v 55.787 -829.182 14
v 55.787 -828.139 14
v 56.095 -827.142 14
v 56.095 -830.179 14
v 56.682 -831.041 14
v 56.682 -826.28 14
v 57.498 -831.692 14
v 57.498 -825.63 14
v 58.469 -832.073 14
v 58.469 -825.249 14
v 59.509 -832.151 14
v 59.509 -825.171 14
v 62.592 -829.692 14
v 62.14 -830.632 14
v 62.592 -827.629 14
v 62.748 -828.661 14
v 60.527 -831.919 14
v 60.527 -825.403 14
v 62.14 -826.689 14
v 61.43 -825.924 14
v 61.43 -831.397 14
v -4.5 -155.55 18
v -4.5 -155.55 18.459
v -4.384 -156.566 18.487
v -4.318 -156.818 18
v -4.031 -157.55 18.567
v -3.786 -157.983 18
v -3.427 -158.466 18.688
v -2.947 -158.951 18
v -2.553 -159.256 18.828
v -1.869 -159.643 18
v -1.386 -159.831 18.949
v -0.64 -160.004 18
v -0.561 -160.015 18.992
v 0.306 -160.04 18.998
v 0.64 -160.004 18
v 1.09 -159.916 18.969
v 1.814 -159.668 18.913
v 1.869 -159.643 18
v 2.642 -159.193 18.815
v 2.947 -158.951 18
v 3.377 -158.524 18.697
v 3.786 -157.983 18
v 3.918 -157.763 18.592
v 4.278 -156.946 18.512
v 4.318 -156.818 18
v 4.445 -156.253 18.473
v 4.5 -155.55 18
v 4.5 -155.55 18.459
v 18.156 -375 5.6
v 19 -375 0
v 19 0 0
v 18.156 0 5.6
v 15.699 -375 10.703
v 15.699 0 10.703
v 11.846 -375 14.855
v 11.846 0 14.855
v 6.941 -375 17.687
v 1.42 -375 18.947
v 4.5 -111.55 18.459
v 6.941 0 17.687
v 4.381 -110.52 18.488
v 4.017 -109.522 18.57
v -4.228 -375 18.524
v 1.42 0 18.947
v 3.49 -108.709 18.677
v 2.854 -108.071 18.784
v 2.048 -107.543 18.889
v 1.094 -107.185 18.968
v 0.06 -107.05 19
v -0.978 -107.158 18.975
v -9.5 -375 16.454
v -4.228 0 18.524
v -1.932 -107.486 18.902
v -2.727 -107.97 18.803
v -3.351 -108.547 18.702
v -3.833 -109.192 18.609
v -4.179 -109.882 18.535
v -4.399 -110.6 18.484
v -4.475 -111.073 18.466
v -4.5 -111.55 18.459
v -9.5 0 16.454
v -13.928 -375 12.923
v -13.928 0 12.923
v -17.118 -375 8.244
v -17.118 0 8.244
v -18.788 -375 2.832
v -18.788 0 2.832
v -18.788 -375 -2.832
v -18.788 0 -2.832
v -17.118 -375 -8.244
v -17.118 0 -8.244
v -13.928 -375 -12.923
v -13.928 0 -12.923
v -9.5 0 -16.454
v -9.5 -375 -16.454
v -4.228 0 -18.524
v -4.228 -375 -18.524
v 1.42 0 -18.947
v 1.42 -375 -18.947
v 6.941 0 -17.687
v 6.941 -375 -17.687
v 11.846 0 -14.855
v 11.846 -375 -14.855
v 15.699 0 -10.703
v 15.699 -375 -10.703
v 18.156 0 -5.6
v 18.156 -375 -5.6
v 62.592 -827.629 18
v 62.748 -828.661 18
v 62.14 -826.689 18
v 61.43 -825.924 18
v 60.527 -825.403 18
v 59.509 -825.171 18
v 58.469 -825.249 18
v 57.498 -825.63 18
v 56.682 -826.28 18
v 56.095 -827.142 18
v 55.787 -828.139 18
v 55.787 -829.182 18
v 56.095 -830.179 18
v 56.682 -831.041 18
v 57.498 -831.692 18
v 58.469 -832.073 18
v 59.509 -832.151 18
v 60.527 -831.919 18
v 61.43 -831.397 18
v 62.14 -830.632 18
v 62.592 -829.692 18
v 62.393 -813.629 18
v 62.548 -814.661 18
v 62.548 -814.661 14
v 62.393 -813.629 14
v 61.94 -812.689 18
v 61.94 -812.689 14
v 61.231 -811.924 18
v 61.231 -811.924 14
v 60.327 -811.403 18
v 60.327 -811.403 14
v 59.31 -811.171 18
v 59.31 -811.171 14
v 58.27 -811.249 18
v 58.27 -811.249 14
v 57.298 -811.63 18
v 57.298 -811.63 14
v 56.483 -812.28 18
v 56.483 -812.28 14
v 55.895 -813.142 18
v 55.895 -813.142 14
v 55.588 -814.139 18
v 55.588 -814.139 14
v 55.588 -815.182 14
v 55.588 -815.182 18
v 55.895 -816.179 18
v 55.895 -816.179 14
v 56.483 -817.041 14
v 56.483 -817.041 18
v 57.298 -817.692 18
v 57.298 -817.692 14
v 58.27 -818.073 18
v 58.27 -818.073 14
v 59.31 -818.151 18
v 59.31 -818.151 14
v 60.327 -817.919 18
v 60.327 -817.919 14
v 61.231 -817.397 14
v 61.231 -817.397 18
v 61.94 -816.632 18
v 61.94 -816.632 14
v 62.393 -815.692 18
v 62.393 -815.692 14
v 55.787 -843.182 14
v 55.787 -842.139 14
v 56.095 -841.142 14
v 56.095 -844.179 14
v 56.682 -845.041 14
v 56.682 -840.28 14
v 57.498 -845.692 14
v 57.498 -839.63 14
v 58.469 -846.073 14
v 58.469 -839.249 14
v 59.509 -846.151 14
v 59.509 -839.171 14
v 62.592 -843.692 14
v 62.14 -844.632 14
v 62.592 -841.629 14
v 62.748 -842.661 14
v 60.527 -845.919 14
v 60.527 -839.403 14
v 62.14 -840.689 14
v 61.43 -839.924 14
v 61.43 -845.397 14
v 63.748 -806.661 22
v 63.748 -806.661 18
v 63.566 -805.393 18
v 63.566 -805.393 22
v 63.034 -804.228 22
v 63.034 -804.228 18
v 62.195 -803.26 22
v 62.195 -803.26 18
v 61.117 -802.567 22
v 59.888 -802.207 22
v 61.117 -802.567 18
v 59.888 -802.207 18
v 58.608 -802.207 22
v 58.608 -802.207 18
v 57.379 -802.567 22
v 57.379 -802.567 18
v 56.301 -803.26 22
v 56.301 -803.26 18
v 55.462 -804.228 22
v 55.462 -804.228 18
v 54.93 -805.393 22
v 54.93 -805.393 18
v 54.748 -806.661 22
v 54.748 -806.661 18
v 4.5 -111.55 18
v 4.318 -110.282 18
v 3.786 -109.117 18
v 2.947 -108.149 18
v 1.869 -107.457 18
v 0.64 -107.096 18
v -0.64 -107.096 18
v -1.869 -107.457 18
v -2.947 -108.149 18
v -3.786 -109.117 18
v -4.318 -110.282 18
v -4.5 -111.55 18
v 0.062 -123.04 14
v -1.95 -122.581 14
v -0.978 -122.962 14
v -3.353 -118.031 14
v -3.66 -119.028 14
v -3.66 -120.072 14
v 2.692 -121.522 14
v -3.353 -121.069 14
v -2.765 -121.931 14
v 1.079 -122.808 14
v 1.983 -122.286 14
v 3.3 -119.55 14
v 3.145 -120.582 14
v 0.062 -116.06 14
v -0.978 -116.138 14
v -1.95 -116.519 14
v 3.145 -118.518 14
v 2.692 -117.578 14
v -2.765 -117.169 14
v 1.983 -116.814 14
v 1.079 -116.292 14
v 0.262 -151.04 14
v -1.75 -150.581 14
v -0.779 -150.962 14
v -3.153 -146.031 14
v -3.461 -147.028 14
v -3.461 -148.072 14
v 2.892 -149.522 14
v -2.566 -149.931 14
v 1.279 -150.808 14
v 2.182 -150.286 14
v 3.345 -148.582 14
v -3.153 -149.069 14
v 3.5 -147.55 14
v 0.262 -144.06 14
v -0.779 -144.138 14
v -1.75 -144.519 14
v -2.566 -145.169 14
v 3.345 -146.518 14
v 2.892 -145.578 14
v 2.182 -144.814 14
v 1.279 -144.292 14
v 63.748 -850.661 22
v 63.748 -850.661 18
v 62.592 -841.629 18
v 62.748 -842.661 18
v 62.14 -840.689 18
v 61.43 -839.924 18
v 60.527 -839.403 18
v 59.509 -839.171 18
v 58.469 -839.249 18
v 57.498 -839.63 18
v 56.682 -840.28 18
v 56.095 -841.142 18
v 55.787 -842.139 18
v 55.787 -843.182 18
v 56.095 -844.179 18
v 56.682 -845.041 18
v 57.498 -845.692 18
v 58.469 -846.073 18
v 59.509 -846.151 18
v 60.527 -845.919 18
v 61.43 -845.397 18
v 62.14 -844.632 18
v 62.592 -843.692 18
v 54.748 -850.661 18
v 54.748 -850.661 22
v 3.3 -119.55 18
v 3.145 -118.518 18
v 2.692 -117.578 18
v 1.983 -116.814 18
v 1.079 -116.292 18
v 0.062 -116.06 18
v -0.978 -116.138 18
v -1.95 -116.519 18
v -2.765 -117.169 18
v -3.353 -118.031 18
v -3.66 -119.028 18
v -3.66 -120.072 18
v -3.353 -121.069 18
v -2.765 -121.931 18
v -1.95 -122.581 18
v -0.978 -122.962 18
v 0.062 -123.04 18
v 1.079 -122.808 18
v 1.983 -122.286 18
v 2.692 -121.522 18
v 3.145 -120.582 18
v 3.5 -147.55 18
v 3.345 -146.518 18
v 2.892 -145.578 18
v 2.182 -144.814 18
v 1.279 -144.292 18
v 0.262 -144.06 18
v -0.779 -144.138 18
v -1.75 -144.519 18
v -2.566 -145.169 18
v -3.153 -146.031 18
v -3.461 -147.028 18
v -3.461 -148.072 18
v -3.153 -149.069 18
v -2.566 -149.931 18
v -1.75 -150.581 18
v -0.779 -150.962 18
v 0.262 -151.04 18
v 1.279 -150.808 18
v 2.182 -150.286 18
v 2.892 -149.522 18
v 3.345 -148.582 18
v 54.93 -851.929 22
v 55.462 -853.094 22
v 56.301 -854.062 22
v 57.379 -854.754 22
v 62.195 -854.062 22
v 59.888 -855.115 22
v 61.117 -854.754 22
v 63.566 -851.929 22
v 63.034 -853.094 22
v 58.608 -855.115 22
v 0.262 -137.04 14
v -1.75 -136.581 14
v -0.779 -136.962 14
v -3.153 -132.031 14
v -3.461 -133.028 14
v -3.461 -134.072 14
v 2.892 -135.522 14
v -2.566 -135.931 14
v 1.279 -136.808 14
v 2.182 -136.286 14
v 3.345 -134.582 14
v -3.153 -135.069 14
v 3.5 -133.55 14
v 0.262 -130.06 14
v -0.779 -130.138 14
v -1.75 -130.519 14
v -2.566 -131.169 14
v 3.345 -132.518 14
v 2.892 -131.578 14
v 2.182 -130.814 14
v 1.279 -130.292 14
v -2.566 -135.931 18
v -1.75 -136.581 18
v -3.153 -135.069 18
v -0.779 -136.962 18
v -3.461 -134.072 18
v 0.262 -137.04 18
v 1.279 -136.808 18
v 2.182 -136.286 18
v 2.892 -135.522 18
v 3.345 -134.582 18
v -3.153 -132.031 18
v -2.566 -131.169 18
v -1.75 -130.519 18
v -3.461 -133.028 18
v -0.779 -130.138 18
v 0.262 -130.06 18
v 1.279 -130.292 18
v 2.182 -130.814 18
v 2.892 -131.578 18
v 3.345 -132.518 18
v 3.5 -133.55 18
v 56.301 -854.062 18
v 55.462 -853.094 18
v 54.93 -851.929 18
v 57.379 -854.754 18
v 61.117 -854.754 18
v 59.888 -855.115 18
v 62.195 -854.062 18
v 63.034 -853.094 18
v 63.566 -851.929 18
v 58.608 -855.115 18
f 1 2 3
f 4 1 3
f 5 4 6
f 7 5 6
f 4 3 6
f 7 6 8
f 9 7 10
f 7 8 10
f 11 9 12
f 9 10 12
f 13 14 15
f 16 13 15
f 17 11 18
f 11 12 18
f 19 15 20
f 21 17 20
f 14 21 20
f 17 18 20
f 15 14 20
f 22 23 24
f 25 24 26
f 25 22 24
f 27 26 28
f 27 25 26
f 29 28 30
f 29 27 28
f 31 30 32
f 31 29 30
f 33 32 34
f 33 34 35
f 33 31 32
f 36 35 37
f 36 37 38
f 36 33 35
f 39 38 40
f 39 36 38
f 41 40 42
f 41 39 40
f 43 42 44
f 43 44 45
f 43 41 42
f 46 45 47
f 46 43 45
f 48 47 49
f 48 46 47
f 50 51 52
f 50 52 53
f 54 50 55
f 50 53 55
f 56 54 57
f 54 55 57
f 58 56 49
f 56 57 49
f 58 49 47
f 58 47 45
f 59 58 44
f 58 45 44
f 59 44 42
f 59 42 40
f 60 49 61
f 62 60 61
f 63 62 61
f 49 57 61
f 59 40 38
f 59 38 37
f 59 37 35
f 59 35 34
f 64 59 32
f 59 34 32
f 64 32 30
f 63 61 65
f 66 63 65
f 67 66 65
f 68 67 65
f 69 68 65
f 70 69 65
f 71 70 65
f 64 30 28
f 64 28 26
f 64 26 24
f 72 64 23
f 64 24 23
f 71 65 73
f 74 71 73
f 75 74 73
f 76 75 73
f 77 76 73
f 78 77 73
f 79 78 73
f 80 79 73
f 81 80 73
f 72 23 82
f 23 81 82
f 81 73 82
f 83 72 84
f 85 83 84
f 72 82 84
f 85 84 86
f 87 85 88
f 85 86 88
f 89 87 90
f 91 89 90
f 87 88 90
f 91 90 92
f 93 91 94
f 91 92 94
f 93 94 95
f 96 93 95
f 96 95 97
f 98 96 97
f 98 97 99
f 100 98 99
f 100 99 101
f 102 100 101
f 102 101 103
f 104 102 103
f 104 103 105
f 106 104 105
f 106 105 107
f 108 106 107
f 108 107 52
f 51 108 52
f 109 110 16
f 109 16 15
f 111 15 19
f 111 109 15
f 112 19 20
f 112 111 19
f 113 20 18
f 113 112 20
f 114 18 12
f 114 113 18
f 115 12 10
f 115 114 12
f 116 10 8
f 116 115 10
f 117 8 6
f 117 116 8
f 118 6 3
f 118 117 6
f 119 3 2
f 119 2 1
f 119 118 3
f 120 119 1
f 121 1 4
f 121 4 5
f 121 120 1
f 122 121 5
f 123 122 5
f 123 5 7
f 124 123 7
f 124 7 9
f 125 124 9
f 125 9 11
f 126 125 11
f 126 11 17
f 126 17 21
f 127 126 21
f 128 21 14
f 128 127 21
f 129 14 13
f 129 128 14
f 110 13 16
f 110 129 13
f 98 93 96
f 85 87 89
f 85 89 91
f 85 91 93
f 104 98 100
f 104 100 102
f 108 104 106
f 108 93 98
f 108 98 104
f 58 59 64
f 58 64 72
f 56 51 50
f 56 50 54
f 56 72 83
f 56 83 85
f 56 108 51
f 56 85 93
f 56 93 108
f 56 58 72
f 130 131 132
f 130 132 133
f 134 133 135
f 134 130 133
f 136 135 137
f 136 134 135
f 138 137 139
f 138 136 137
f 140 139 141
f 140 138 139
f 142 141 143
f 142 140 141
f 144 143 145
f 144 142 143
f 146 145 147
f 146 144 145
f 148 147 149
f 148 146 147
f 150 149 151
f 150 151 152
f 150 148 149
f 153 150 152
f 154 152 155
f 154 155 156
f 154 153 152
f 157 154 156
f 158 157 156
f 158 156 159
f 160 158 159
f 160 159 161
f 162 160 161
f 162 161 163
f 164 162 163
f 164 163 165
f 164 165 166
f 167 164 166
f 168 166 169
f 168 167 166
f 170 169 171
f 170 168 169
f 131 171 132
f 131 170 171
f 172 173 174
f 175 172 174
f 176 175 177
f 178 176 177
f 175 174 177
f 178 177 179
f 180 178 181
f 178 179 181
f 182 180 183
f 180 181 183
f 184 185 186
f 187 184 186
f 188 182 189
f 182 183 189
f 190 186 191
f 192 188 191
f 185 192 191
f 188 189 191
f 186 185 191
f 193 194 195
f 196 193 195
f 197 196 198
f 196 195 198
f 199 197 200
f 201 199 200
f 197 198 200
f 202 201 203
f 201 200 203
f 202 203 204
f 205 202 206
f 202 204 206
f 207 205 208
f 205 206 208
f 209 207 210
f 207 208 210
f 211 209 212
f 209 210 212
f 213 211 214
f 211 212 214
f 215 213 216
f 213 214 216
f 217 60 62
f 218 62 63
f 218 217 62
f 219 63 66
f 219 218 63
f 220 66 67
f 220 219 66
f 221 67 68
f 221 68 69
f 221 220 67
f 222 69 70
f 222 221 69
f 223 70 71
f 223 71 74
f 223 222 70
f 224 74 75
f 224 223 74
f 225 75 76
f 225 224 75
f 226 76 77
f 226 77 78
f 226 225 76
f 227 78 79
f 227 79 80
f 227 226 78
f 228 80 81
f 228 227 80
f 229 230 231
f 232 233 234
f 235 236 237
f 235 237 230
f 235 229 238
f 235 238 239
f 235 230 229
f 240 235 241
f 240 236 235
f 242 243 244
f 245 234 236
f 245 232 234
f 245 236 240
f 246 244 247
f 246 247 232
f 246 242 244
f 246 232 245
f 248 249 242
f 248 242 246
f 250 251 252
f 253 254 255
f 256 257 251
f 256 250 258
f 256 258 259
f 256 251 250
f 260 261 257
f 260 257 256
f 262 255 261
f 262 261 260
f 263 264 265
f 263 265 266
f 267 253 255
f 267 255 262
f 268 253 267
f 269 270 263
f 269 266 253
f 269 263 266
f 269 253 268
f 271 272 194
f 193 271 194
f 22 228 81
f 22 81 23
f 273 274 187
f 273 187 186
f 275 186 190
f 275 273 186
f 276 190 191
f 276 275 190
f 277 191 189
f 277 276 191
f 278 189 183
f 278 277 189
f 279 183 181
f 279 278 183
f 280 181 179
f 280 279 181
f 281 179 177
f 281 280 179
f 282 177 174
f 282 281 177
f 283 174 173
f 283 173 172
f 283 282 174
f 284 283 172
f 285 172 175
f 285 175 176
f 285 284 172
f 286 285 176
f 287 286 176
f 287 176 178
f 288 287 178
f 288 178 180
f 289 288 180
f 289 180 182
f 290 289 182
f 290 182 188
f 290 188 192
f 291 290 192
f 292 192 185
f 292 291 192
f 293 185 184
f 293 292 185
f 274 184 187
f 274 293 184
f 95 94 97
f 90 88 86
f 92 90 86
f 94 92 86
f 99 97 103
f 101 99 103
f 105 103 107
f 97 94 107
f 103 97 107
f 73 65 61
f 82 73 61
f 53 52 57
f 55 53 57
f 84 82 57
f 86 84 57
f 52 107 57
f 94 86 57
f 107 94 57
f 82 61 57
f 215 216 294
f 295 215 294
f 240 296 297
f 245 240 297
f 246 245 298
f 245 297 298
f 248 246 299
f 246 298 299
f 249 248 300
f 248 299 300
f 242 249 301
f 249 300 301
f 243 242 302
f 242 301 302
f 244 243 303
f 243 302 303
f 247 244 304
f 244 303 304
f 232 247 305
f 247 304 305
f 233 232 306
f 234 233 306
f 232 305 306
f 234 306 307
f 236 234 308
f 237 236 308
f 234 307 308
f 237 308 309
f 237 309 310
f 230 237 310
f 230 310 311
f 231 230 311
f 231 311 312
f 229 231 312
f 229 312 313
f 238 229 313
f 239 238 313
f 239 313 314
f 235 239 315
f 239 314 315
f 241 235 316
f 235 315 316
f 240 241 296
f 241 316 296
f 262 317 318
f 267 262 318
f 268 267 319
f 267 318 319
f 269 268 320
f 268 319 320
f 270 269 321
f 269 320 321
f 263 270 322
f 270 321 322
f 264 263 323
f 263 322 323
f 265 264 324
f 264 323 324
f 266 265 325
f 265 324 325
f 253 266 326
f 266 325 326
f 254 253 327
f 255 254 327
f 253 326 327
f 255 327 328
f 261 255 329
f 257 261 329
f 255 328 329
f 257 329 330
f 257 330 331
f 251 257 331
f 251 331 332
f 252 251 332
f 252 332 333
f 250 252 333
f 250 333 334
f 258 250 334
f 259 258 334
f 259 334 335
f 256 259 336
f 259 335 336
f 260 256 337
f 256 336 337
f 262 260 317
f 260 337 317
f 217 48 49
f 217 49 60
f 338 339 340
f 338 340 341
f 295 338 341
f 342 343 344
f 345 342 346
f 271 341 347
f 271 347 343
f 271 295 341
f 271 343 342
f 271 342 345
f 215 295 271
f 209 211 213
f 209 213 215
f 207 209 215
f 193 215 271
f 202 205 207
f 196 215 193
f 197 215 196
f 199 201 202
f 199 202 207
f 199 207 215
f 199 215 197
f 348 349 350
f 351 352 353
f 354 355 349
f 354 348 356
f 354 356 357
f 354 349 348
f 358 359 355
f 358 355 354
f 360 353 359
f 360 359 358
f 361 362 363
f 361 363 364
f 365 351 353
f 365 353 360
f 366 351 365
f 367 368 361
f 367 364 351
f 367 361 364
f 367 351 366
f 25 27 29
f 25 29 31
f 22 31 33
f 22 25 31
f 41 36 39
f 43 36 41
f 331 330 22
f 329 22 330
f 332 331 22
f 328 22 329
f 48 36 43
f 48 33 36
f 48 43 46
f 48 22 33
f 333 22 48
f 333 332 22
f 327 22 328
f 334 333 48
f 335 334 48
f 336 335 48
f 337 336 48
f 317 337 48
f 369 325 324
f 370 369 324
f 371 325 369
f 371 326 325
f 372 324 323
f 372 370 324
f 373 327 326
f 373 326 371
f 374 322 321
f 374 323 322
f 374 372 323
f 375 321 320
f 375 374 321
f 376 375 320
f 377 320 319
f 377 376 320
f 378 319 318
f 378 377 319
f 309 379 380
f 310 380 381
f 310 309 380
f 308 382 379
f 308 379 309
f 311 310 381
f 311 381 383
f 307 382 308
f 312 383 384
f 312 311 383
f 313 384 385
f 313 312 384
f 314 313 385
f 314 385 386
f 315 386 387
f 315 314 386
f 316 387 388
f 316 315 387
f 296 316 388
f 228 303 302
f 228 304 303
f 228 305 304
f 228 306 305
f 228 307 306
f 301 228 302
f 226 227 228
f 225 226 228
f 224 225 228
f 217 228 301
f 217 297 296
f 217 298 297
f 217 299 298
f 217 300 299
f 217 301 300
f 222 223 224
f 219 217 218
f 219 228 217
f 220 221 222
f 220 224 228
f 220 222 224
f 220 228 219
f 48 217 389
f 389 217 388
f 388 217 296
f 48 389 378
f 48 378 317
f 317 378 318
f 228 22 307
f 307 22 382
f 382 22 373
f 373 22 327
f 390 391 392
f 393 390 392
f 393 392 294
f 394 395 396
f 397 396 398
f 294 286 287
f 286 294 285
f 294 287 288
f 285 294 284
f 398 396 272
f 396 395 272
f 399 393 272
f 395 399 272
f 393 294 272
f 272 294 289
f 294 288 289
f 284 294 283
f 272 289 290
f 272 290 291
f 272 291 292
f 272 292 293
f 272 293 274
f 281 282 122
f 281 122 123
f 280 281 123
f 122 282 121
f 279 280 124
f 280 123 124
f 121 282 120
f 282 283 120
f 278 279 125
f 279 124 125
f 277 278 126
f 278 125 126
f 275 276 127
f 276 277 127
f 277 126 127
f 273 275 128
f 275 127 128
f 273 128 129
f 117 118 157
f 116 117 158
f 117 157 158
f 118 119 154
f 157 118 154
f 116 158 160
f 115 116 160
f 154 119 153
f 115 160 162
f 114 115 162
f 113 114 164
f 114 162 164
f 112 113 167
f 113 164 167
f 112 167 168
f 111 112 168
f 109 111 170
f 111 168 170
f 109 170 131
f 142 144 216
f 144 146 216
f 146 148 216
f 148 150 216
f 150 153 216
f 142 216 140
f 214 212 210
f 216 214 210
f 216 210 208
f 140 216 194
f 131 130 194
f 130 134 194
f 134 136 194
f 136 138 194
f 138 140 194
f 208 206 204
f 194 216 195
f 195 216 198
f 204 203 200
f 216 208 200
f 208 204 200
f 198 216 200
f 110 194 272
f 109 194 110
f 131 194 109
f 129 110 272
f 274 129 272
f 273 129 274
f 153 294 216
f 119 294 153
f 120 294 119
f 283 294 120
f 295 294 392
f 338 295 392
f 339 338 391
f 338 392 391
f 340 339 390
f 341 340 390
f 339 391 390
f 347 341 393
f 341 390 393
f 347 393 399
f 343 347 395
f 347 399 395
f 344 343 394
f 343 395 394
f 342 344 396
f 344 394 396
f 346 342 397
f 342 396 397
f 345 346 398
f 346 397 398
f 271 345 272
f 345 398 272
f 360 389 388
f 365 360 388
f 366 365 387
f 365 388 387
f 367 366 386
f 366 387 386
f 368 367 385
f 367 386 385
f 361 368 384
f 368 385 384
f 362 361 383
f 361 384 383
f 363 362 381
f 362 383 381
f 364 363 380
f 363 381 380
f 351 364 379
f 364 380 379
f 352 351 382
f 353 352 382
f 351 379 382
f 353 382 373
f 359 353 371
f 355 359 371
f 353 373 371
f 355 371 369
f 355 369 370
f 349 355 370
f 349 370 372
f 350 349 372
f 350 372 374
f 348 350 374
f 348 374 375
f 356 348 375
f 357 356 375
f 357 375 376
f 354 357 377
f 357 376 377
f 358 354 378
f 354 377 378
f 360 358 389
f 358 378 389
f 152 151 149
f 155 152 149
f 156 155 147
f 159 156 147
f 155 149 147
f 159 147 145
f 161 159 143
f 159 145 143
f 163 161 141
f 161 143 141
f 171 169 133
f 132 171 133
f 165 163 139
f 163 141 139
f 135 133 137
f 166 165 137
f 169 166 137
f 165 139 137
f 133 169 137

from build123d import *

# Parameters (mm, degrees)
F0_R      = 19
F1_DEPTH  = 375
F4_DEPTH  = 5
F5_R      = 3.5
F6_DEPTH  = 4
F8_DEPTH  = 4
F9_R      = 3.5
F10_DEPTH = 4


with BuildPart() as f1:
    # F0 (on Front) → F1 (new body)
    with BuildSketch(Plane.XZ):
        Circle(F0_R)
    extrude(amount=F1_DEPTH)

    # F3 (on offset) → F4 (cut)
    with BuildSketch(Plane.XY.offset(18)):
        with BuildLine():
            Line((4.5, -155.55), (4.5, -111.55))
            ThreePointArc((4.5, -111.55), (0, -107.05), (-4.5, -111.55))
            Line((-4.5, -111.55), (-4.5, -155.55))
            ThreePointArc((-4.5, -155.55), (0, -160.05), (4.5, -155.55))
        make_face()
    extrude(amount=F4_DEPTH, mode=Mode.SUBTRACT)

    # F5 (on face) → F6 (cut)
    with BuildSketch(Plane.XY.offset(18)):
        with Locations((0, -147.55)):
            Circle(F5_R)
        with Locations((0, -133.55)):
            Circle(F5_R)
        with Locations((-0.199509, -119.55)):
            Circle(F5_R)
    extrude(amount=-F6_DEPTH, mode=Mode.SUBTRACT)


with BuildPart() as f8:
    # F7 (on offset) → F8 (new body)
    with BuildSketch(Plane.XY.offset(18)):
        with BuildLine():
            Line((63.747939, -850.660761), (63.747939, -806.660761))
            ThreePointArc((63.747939, -806.660761), (59.247939, -802.160761), (54.747939, -806.660761))
            Line((54.747939, -806.660761), (54.747939, -850.660761))
            ThreePointArc((54.747939, -850.660761), (59.247939, -855.160761), (63.747939, -850.660761))
        make_face()
    extrude(amount=F8_DEPTH)

    # F9 (on face) → F10 (join)
    with BuildSketch(Plane.XY.offset(18)):
        with Locations((59.247939, -842.660761)):
            Circle(F9_R)
        with Locations((59.247939, -828.660761)):
            Circle(F9_R)
        with Locations((59.04843, -814.660761)):
            Circle(F9_R)
    extrude(amount=-F10_DEPTH)


solid = Compound([f1.part, f8.part])
